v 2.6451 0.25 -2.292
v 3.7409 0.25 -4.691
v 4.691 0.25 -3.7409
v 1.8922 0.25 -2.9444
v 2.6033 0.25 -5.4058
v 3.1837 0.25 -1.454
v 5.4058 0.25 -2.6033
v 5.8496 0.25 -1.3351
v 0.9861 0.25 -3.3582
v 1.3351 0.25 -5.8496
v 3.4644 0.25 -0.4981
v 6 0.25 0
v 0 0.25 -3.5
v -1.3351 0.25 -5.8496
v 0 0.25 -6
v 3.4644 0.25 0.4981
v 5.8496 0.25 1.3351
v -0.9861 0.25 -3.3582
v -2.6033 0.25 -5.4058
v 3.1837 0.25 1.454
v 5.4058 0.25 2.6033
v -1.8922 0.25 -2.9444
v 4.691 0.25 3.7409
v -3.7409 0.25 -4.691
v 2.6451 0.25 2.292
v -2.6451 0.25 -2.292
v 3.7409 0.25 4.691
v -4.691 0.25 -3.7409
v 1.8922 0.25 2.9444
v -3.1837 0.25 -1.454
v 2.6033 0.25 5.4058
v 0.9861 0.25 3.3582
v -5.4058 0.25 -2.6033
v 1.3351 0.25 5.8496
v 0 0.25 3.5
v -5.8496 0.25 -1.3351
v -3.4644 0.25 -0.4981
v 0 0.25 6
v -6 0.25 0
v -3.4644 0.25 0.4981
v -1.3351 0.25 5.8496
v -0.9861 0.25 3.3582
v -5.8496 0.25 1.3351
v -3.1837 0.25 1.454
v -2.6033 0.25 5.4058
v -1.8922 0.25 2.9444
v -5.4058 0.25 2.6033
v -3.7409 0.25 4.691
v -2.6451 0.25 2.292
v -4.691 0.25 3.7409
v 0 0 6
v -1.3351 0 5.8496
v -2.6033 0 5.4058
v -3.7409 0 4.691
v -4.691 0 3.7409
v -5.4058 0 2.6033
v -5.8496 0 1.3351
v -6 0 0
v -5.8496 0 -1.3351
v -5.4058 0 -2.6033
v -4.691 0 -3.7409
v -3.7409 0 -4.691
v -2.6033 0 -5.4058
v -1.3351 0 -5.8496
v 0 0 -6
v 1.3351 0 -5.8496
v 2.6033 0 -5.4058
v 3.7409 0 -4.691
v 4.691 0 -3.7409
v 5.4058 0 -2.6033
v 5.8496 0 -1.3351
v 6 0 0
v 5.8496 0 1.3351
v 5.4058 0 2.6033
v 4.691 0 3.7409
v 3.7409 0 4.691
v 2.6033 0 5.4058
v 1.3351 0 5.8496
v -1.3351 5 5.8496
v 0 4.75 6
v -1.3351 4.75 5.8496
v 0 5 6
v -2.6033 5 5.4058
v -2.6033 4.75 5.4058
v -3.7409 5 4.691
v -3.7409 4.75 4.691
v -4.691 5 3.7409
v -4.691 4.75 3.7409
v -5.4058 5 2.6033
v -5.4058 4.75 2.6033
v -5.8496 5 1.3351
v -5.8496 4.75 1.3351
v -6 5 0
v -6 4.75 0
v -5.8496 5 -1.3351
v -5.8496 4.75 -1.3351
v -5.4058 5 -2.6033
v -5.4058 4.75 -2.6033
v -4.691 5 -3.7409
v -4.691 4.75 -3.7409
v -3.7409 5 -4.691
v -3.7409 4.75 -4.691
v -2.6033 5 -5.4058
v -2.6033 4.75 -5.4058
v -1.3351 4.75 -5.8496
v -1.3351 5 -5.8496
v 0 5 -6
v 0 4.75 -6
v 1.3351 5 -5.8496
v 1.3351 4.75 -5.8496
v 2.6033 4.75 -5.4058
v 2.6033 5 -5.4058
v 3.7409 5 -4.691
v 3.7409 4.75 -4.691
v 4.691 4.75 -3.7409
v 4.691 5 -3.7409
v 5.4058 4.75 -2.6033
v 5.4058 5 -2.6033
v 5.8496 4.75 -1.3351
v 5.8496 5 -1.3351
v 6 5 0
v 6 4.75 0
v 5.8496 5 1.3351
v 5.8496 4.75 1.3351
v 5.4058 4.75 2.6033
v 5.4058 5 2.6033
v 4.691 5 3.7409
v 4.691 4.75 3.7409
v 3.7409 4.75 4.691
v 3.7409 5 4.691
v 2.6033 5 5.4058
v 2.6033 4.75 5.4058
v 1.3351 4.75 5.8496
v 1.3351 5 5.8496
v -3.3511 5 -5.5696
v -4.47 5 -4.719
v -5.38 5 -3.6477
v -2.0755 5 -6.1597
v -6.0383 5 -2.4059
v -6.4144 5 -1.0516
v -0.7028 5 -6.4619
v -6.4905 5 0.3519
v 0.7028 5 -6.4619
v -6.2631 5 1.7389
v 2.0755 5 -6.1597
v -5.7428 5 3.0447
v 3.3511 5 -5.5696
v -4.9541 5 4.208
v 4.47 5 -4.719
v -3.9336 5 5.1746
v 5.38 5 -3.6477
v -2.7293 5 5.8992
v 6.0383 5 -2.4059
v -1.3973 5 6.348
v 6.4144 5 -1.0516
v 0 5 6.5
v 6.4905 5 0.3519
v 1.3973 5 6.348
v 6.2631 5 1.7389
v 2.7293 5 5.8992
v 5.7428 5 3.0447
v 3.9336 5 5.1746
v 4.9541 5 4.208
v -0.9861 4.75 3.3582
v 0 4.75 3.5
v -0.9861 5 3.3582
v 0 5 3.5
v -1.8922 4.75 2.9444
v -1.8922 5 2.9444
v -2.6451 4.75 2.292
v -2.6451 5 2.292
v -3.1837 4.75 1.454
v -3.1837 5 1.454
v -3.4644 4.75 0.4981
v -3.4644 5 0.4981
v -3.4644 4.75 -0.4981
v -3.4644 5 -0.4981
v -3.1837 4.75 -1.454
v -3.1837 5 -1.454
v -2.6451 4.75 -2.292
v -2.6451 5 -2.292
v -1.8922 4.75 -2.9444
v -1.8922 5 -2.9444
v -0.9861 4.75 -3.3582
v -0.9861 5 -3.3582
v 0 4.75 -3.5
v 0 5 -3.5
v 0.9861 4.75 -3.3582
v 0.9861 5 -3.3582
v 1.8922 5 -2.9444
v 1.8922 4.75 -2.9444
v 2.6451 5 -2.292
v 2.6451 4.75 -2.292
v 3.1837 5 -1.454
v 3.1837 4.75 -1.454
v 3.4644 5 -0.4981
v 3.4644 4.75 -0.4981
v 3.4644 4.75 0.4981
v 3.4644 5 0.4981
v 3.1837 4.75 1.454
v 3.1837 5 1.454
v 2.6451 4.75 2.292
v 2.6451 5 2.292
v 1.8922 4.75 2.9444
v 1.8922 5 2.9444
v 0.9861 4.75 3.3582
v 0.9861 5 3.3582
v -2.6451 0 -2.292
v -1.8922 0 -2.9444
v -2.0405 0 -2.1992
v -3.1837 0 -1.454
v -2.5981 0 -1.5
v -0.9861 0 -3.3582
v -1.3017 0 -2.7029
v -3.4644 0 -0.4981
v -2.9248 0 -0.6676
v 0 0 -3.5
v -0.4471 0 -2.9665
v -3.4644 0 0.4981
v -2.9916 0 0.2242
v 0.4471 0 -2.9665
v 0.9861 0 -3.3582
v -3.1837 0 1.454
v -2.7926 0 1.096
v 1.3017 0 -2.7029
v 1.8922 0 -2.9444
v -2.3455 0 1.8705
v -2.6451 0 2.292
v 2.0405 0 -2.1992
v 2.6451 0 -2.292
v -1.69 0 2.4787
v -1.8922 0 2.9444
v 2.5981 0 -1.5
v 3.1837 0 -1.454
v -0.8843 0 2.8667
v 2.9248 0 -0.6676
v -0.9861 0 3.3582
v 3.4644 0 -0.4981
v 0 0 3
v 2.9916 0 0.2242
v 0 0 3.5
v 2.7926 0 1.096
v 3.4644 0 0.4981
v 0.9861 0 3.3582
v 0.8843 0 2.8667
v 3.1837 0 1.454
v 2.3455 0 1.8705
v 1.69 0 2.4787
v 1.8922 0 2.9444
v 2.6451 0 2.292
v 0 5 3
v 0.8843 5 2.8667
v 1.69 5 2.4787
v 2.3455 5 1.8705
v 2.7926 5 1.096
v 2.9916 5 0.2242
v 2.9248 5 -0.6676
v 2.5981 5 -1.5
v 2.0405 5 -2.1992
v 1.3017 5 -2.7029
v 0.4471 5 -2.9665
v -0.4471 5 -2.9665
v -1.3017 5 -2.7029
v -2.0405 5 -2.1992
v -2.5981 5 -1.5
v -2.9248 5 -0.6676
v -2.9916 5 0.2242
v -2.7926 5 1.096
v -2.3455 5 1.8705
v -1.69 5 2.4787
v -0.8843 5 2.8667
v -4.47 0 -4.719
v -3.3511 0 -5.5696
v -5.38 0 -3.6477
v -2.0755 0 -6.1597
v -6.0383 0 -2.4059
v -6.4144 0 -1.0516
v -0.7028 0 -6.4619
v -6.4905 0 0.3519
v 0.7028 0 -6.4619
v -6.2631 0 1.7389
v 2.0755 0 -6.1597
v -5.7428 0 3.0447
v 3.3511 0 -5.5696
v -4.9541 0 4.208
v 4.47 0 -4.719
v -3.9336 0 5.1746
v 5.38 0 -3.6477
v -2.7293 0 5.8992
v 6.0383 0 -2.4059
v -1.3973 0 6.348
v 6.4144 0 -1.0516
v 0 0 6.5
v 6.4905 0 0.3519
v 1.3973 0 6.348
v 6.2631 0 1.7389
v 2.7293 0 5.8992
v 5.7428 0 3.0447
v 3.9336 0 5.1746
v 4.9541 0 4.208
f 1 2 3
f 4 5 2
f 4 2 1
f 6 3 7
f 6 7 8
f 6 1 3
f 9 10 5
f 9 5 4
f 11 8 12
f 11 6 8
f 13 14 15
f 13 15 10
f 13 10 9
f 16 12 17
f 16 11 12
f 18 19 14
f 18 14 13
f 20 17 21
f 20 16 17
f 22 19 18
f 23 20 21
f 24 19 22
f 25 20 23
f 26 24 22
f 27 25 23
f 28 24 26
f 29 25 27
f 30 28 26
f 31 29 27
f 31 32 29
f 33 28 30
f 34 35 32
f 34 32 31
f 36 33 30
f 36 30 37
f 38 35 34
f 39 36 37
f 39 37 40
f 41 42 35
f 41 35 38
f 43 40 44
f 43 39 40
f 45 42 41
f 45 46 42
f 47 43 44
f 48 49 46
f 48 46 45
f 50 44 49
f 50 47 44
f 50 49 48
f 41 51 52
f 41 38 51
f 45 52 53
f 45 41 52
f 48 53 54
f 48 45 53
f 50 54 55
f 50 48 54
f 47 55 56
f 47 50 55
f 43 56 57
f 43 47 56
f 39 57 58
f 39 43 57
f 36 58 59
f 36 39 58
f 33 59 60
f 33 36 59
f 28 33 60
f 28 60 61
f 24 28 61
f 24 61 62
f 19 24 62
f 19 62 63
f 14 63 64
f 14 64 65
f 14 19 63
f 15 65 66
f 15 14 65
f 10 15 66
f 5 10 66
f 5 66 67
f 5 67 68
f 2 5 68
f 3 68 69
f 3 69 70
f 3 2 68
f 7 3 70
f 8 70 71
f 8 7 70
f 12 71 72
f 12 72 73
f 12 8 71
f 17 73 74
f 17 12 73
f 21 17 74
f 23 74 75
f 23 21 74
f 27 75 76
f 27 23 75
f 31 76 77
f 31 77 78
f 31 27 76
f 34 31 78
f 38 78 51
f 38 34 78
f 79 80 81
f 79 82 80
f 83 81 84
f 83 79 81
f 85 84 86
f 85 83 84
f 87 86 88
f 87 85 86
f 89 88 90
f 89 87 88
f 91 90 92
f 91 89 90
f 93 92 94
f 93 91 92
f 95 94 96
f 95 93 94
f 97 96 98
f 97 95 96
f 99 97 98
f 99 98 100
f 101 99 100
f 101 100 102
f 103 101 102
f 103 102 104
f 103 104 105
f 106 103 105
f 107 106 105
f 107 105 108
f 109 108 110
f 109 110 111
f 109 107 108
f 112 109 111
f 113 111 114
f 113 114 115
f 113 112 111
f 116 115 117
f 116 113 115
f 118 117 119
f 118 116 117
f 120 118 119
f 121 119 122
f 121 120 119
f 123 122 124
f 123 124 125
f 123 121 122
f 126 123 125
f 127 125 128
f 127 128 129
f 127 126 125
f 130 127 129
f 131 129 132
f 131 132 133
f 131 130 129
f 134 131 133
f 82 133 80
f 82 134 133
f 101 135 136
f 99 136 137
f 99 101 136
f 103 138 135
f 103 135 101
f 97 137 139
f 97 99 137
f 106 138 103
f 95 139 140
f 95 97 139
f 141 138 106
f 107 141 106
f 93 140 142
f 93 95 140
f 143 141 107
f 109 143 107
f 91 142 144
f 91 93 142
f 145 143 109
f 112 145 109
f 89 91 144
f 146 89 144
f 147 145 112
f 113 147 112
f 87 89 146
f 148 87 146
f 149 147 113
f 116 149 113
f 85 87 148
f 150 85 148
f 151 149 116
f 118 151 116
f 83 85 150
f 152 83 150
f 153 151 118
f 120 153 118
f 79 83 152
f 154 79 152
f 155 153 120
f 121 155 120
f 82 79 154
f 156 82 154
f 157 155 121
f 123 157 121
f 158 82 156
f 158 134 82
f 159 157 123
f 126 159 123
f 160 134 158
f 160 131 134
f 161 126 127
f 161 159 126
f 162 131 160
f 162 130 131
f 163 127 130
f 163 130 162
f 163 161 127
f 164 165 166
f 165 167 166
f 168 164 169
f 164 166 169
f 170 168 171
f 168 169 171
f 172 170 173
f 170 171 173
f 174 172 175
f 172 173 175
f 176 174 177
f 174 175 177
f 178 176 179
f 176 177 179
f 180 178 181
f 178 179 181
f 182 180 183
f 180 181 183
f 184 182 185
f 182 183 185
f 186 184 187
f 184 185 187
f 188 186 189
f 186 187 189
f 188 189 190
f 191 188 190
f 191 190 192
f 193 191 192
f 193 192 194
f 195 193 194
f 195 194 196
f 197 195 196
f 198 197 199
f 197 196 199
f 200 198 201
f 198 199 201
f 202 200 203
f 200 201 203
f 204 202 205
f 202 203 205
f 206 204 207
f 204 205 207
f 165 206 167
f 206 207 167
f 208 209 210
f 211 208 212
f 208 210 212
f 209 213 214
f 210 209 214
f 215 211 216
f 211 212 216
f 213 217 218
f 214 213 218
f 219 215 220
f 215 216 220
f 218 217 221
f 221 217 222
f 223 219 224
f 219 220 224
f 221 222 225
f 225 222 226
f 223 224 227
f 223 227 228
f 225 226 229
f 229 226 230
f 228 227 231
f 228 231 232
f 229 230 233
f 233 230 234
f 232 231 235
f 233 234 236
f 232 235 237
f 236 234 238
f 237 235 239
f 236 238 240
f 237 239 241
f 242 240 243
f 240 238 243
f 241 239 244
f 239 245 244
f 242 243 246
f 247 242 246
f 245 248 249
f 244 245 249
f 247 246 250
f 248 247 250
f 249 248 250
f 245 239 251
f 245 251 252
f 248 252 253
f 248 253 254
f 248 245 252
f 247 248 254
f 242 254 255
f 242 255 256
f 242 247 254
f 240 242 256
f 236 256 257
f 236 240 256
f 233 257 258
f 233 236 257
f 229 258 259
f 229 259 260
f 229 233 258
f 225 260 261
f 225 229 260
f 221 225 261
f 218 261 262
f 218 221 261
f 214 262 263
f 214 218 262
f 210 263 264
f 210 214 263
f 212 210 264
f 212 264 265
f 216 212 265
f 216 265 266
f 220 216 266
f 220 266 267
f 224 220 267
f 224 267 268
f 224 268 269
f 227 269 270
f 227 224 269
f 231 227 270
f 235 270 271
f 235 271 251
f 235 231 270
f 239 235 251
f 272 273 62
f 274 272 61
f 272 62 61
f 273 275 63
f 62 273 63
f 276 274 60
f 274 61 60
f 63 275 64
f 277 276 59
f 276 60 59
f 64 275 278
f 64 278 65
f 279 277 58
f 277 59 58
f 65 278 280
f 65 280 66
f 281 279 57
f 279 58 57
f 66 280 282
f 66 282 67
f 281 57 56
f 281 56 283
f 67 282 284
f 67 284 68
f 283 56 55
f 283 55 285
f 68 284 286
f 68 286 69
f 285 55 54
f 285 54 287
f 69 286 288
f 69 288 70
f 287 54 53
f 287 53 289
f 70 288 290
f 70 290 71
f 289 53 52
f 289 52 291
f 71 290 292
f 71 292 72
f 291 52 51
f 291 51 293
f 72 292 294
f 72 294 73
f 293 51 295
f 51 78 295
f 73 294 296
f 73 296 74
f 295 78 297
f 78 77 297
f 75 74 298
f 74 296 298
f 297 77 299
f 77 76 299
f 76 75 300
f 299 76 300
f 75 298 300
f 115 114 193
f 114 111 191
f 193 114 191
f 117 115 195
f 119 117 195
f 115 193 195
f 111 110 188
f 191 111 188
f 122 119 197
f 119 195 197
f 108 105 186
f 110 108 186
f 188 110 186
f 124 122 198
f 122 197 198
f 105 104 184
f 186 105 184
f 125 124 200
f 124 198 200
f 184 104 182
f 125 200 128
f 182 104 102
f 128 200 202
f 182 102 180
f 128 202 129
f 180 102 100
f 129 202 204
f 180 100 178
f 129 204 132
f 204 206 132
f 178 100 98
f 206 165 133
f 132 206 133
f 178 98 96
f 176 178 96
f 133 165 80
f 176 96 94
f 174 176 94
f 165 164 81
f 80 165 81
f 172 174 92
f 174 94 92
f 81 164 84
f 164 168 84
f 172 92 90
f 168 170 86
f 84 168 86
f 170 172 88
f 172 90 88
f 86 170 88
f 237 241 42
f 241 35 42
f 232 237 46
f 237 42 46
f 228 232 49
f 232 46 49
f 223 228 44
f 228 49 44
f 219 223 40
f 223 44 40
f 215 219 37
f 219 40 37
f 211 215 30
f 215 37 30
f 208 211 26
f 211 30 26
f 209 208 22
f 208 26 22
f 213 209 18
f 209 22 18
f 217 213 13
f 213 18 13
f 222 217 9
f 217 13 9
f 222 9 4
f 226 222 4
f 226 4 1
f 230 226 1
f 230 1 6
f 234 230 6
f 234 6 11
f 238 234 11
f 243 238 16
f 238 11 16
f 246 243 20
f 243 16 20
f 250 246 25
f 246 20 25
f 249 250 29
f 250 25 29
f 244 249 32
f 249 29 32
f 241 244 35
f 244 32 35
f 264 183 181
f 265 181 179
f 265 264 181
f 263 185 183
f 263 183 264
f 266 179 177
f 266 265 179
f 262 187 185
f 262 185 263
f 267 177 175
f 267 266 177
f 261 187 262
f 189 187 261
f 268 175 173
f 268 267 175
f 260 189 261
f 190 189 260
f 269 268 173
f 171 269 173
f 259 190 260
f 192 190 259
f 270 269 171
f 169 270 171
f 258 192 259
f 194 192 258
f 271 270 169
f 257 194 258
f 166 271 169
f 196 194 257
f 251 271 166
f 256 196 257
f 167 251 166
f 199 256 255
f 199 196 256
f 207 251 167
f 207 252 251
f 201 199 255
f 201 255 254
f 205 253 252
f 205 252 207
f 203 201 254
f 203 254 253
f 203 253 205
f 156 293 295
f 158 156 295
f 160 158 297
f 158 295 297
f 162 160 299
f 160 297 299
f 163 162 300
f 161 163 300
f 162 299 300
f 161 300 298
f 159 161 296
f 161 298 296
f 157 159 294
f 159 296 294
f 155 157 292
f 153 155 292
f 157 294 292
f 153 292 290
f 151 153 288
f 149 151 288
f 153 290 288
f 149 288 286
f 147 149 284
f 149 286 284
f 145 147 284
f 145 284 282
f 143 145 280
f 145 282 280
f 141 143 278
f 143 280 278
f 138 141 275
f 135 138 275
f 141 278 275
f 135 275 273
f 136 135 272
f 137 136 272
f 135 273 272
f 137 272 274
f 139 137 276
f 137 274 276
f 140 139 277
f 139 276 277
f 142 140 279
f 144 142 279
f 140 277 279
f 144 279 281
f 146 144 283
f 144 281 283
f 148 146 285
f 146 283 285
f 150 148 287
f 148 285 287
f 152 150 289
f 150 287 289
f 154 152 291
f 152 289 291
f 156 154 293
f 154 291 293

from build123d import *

# Parameters (mm, degrees)
SKETCH1_R           = 6.5
SKETCH1_R_2         = 3
BOSS_EXTRUDE1_DEPTH = 5
SKETCH2_W           = 2.5
SKETCH2_H           = 0.25


with BuildPart() as part:
    # Sketch1 → Boss-Extrude1 (new body)
    with BuildSketch(Plane(origin=(0, 0, 0), x_dir=(1, 0, 0), z_dir=(0, 1, 0))):
        with Locations(Location((0, 0, 0), (0, 0, 270))):
            Circle(SKETCH1_R)
        with Locations(Location((0, 0, 0), (0, 0, 270))):
            Circle(SKETCH1_R_2, mode=Mode.SUBTRACT)
    extrude(amount=BOSS_EXTRUDE1_DEPTH)

    # Sketch2 → Cut-Revolve1 (revolve, cut)
    with BuildSketch(Plane.XY, mode=Mode.PRIVATE) as cut_revolve1_sk:
        with Locations((-4.75, 4.875)):
            Rectangle(SKETCH2_W, SKETCH2_H)
        with Locations((-4.75, 0.125)):
            Rectangle(SKETCH2_W, SKETCH2_H)
    revolve(cut_revolve1_sk.sketch.rotate(Axis((0, 5, 0), (0, -1, 0)), 270), axis=Axis((0, 5, 0), (0, -1, 0)), mode=Mode.SUBTRACT)


solid = part.part
